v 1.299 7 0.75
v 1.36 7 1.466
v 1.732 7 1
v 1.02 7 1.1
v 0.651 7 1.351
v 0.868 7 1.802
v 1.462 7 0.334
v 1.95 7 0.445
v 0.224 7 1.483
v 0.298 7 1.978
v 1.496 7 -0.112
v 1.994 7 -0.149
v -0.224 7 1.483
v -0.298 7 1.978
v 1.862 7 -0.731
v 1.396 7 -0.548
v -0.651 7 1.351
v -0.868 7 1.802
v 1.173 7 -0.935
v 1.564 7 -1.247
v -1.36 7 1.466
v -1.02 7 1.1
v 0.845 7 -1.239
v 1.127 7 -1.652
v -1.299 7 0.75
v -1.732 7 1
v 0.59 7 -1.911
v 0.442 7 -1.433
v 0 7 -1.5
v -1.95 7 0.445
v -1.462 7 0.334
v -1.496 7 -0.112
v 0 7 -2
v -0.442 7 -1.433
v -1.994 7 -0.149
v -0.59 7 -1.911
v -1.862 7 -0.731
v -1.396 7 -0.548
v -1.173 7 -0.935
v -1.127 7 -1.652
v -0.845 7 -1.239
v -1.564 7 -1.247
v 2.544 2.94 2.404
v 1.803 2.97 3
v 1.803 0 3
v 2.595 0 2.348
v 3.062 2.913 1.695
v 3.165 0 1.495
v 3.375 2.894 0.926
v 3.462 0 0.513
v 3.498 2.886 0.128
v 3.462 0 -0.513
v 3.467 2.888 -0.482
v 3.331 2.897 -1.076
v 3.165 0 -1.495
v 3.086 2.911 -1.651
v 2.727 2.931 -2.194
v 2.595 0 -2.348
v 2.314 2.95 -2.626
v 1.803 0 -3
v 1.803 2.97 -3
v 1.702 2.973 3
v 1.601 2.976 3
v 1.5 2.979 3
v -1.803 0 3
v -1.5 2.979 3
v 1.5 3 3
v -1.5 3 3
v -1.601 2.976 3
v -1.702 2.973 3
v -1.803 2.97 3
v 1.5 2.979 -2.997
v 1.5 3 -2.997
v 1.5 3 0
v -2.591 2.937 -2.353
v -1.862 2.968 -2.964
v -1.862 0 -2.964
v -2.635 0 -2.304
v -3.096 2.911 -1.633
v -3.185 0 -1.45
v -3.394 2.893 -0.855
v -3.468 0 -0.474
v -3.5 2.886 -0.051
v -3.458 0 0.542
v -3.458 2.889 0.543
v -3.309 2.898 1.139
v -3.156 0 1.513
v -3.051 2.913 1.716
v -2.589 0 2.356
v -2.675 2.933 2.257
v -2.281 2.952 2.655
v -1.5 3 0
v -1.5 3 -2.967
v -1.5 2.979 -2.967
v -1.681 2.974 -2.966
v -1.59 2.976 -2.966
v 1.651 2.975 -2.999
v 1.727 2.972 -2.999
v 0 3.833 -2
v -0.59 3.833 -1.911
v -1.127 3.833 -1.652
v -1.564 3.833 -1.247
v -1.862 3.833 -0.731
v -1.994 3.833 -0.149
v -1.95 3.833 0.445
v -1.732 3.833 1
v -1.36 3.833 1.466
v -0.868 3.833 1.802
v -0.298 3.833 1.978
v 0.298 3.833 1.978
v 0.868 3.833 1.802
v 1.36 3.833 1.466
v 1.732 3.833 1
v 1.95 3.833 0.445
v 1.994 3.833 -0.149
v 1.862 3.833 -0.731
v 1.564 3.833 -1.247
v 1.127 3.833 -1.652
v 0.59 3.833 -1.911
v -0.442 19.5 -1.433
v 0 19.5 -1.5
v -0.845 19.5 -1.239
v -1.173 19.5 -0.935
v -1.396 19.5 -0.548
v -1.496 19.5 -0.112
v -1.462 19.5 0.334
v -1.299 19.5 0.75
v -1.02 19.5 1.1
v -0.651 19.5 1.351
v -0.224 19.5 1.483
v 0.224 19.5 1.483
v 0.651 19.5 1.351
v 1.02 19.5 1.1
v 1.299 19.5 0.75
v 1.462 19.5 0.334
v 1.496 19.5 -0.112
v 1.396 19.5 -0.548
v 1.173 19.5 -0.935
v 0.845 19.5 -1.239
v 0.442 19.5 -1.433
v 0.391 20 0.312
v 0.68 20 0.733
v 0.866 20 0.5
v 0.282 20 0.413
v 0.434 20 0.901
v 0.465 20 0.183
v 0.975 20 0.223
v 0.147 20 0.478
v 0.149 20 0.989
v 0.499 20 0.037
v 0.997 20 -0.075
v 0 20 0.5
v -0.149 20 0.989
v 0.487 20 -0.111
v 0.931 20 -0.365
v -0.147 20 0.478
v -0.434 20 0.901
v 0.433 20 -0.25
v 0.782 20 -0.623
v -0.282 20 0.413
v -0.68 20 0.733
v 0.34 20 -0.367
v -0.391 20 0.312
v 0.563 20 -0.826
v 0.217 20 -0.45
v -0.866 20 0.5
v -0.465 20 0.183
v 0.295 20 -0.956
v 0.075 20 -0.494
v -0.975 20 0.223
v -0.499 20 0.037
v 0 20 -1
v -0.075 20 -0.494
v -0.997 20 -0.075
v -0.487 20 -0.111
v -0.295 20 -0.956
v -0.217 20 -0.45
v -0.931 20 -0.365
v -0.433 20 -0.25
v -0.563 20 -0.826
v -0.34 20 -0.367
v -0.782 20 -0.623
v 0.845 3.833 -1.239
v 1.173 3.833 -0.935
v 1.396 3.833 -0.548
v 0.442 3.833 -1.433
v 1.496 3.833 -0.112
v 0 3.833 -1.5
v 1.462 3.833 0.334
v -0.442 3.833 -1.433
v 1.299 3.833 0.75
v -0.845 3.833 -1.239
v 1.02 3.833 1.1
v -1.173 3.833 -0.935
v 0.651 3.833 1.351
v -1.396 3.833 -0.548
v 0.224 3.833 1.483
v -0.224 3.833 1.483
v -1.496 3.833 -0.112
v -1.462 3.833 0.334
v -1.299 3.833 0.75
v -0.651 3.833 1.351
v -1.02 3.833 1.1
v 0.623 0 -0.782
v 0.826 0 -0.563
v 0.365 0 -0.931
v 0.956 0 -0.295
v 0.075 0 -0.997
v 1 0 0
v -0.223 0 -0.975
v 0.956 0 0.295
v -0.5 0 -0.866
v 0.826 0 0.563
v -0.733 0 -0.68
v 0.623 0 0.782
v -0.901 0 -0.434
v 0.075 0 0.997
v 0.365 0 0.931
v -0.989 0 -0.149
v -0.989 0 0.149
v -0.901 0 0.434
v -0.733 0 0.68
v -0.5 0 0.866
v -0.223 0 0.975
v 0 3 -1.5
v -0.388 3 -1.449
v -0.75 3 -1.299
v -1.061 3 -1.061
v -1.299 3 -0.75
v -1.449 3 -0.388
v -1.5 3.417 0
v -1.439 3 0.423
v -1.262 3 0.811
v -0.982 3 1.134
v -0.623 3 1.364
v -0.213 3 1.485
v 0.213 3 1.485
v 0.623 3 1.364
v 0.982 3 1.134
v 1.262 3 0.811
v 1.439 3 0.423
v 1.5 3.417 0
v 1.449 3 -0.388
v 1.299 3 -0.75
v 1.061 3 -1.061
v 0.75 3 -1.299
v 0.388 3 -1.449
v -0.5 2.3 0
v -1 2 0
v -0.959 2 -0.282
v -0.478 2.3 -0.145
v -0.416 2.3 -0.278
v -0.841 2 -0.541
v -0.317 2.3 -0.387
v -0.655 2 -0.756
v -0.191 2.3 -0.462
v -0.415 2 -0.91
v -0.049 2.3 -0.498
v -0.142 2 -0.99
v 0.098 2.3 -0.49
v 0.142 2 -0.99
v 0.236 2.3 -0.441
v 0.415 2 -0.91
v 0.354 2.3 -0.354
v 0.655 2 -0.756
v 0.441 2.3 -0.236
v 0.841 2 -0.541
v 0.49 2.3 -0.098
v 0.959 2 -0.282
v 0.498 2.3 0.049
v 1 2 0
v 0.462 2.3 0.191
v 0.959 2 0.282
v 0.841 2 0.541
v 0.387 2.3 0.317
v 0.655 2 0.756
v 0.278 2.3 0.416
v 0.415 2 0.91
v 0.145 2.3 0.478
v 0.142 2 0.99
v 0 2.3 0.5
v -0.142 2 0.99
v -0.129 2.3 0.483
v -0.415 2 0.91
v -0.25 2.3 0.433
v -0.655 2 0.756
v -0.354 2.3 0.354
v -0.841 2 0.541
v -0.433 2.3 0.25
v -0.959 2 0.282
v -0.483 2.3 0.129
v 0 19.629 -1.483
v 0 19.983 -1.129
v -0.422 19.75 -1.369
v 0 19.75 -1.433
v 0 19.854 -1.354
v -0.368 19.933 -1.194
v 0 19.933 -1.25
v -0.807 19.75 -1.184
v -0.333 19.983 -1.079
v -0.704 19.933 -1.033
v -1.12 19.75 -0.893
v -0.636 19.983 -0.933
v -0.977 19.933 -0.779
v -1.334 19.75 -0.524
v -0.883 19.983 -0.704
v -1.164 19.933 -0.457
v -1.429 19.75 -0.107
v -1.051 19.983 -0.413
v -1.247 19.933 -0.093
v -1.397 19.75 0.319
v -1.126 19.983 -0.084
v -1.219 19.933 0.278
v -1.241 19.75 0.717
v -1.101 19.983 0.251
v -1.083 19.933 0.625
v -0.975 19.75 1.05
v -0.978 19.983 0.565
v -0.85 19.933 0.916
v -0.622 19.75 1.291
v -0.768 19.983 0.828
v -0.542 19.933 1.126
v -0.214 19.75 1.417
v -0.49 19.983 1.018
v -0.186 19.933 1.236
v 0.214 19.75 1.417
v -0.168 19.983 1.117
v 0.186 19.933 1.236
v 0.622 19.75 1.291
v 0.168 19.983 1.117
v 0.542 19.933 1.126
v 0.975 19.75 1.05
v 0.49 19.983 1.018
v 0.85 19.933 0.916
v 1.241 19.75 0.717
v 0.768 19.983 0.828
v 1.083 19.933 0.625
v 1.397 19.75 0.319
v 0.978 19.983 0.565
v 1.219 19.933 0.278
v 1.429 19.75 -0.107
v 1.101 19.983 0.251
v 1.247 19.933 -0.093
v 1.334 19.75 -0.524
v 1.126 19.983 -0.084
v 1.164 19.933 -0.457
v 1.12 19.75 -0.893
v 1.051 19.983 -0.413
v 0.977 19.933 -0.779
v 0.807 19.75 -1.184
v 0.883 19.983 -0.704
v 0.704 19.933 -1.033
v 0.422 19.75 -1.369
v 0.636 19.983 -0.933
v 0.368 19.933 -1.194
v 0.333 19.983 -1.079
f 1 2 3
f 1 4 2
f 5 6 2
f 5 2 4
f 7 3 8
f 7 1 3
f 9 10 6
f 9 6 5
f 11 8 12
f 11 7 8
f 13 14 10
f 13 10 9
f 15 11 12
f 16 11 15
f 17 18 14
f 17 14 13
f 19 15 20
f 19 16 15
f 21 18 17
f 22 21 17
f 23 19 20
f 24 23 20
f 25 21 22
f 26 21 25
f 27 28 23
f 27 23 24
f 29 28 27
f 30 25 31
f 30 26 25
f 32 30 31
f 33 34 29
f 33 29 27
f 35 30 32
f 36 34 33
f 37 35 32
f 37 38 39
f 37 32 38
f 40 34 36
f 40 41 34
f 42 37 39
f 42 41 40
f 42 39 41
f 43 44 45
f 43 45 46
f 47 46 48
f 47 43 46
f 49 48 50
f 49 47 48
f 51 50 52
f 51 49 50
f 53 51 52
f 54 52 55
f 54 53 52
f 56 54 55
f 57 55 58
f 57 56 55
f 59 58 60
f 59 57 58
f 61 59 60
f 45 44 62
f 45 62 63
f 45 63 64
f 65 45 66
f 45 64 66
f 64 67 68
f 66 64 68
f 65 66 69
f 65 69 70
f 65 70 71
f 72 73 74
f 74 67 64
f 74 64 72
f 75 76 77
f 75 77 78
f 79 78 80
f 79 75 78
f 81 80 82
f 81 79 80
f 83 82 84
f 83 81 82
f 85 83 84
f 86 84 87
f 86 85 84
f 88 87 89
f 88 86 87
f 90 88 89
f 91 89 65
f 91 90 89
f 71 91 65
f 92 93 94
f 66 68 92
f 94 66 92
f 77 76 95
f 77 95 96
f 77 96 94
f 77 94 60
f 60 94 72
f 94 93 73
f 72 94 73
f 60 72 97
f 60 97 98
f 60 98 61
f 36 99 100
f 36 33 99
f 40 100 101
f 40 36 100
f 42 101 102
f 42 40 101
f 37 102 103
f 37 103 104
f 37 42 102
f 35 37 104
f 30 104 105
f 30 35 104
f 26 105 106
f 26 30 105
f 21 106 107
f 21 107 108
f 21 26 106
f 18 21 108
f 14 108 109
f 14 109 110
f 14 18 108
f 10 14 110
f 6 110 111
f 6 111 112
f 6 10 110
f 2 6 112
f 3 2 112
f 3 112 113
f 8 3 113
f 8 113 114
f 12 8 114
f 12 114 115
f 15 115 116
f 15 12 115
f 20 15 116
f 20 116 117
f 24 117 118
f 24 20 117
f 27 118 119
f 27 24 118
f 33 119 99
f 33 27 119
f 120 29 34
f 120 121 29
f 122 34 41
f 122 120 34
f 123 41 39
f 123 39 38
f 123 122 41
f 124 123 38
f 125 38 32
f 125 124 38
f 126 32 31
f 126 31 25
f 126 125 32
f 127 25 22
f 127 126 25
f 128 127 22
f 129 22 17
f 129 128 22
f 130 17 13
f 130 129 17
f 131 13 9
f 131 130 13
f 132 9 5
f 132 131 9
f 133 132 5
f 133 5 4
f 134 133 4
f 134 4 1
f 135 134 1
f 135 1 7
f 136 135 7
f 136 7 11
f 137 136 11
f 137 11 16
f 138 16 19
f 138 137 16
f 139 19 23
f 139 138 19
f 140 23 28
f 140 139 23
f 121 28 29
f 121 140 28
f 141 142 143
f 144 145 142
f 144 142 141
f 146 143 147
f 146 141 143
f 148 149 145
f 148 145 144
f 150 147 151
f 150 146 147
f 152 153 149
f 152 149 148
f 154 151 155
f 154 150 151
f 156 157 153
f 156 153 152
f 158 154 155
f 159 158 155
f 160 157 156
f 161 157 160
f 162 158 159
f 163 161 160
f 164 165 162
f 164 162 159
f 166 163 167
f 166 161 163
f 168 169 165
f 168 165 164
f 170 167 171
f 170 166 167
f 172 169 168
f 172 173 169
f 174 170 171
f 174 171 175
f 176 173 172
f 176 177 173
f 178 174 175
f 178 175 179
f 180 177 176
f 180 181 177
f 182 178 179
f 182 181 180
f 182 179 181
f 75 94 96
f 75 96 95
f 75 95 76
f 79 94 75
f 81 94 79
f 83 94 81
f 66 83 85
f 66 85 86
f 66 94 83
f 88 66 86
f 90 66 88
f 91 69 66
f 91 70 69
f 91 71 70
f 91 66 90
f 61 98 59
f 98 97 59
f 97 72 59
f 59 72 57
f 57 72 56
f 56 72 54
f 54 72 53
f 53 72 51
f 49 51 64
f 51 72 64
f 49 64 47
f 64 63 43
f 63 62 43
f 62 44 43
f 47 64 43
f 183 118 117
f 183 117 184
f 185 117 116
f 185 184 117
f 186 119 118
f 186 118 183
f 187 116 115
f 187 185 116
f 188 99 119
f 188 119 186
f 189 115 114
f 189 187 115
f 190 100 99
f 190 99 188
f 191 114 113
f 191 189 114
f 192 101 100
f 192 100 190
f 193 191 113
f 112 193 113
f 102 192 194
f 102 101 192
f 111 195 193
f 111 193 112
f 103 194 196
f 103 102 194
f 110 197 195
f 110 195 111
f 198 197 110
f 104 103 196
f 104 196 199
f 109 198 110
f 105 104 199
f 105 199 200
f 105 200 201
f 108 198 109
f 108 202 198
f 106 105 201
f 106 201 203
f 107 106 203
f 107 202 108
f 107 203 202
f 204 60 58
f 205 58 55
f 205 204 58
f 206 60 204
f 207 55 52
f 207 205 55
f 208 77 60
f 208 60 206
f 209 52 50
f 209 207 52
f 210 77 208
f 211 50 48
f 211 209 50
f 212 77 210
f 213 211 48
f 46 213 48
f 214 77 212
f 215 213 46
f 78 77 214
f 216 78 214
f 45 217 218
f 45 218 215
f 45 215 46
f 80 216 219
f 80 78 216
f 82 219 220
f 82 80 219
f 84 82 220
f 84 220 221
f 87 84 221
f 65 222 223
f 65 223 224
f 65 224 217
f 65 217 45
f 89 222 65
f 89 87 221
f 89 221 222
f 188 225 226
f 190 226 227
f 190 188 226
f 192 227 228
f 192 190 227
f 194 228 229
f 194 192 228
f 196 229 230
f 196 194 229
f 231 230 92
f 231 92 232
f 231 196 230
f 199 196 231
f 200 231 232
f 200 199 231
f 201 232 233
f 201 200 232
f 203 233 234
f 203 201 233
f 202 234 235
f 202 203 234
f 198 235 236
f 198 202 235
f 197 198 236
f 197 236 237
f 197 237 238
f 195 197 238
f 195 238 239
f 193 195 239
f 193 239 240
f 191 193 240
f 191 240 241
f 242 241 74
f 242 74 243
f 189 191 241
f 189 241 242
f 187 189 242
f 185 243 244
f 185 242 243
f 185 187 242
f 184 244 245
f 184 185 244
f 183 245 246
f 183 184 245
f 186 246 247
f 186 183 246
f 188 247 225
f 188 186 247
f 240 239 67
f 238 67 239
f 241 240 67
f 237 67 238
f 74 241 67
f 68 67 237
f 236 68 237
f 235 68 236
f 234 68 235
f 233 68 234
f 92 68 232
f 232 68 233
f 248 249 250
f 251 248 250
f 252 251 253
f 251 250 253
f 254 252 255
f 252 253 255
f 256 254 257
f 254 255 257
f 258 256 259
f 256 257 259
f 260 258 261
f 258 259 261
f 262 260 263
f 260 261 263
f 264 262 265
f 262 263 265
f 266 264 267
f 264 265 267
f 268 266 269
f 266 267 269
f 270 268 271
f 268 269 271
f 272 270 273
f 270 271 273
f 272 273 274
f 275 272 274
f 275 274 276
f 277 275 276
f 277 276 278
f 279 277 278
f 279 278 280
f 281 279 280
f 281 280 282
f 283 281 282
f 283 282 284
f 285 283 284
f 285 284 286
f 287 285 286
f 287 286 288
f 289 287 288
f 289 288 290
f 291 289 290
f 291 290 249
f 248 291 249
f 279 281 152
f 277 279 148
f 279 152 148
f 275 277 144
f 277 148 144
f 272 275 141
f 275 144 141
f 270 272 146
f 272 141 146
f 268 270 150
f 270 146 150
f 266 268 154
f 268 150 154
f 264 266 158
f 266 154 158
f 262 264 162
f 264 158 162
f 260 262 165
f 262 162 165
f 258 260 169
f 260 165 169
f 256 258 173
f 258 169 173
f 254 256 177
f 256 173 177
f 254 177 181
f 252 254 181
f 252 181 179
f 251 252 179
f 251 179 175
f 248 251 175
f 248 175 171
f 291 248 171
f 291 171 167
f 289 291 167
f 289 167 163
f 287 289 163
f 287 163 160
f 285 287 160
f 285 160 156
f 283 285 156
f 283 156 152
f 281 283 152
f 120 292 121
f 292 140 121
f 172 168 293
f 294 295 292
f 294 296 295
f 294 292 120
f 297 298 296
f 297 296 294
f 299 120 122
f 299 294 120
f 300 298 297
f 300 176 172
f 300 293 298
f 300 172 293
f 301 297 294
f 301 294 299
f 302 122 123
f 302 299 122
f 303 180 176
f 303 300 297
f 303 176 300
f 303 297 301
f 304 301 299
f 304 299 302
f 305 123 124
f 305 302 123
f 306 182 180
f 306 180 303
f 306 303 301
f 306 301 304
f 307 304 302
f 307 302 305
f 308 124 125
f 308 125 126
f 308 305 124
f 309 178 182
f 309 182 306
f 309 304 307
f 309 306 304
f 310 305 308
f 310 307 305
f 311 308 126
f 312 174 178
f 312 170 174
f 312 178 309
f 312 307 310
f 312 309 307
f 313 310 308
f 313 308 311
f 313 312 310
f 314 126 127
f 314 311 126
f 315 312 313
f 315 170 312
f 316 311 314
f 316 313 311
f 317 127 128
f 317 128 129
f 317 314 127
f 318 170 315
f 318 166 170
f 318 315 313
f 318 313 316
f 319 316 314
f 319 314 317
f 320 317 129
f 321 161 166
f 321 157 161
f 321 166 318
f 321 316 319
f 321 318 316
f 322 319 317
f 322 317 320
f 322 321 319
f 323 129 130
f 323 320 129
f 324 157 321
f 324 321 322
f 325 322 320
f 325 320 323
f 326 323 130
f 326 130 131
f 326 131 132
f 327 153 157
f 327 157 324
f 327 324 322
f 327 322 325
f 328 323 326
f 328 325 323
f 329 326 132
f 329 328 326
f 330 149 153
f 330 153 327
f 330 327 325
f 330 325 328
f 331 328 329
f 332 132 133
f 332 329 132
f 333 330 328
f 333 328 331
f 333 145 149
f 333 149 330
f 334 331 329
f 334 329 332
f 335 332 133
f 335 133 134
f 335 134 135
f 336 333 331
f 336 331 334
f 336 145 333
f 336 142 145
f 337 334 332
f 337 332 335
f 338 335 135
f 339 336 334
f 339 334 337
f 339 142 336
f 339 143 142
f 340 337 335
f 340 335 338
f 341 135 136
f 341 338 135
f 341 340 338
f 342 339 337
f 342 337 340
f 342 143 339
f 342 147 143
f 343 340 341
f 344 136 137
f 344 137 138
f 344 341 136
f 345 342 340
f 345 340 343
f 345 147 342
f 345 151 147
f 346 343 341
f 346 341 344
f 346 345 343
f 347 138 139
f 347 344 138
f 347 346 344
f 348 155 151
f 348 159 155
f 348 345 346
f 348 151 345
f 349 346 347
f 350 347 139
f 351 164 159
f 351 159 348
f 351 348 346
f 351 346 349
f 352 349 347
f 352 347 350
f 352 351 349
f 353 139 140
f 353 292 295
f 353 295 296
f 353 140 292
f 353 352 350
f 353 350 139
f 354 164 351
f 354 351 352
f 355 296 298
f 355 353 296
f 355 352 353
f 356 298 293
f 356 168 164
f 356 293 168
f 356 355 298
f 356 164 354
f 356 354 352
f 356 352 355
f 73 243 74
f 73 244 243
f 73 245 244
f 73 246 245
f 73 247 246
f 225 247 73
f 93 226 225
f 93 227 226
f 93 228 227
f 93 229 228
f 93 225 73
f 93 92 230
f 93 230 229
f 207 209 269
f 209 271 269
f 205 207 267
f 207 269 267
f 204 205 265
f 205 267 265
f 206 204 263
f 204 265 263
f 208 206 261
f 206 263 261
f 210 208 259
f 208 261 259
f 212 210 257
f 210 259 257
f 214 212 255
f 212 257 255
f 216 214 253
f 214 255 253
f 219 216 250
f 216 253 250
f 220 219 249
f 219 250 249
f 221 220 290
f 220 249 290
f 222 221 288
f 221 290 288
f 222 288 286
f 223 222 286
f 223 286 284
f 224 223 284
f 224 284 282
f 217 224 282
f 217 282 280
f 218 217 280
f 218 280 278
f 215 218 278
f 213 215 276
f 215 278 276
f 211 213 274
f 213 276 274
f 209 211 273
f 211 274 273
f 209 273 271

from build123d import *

# Parameters (mm, degrees)
SKETCH2_R                 = 0.5
CUT_EXTRUDE2_DEPTH        = 21.603397778
F_2_0MM_DOWEL_HOLE1_D     = 2
F_2_0MM_DOWEL_HOLE1_DEPTH = 2
F_2_0MM_DOWEL_HOLE1_TIP   = 0.600860619
CUT_EXTRUDE3_DEPTH        = 21.603397778
CUT_EXTRUDE4_DEPTH        = 10


with BuildPart() as part:
    # Sketch1 → Revolve2 (revolve)
    with BuildSketch(Plane.XY, mode=Mode.PRIVATE) as revolve2_sk:
        with BuildLine():
            Line((0, 0), (-3.5, 0))
            Line((-3.5, 0), (-3.5, 3))
            Line((-3.5, 3), (-1.5, 3))
            Line((-1.5, 3), (-1.5, 3.833209081))
            Line((-1.5, 3.833209081), (-2, 3.833209081))
            Line((-2, 3.833209081), (-2, 7))
            Line((-2, 7), (-1.5, 7))
            Line((-1.5, 7), (-1.5, 19.5))
            ThreePointArc((-1.5, 19.5), (-1.353553391, 19.853553391), (-1, 20))
            Line((-1, 20), (0, 20))
            Line((0, 20), (0, 0))
        make_face()
    revolve(revolve2_sk.sketch.rotate(Axis((0, 7, 0), (0, 1, 0)), 270), axis=Axis((0, 7, 0), (0, 1, 0)))

    # Sketch2 → Cut-Extrude2 (cut, through all)
    with BuildSketch(Plane(origin=(0, 20, 0), x_dir=(1, 0, 0), z_dir=(0, 1, 0))):
        with Locations(Location((0, 0, 0), (0, 0, 270))):
            Circle(SKETCH2_R)
    extrude(amount=-CUT_EXTRUDE2_DEPTH, mode=Mode.SUBTRACT)

    # Ø2.0mm Dowel Hole1
    with Locations(Plane(origin=(0, 0, 0), x_dir=(-1, 0, 0), z_dir=(0, -1, 0))):
        with Locations((0, 0)):
            Hole(F_2_0MM_DOWEL_HOLE1_D / 2, depth=F_2_0MM_DOWEL_HOLE1_DEPTH)
            with Locations((0, 0, -(F_2_0MM_DOWEL_HOLE1_DEPTH + F_2_0MM_DOWEL_HOLE1_TIP / 2))):  # 118° drill point
                Cone(0, F_2_0MM_DOWEL_HOLE1_D / 2, F_2_0MM_DOWEL_HOLE1_TIP, mode=Mode.SUBTRACT)

    # Sketch6 → Cut-Extrude3 (cut, through all)
    with BuildSketch(Plane(origin=(0, 20, 0), x_dir=(1, 0, 0), z_dir=(0, 1, 0))):
        with BuildLine():
            Line((1.802775638, -3), (-1.802775638, -3))
            ThreePointArc((-1.802775638, -3), (0, -3.5), (1.802775638, -3))
        make_face()
        with BuildLine():
            Line((-1.861759264, 2.963756475), (1.802775638, 3))
            ThreePointArc((1.802775638, 3), (-0.034614525, 3.499828829), (-1.861759264, 2.963756475))
        make_face()
    extrude(amount=-CUT_EXTRUDE3_DEPTH, mode=Mode.SUBTRACT)

    # Sketch7 → Cut-Extrude4 (cut)
    with BuildSketch(Plane.XY.offset(3)):
        with BuildLine():
            Line((-6.314985728, 2.627394042), (-6.005388139, 3.404344388))
            Line((-6.005388139, 3.404344388), (-1.5, 3.41660454))
            Line((-1.5, 3.41660454), (-1.5, 2.979046191))
            ThreePointArc((-1.5, 2.979046191), (-3.9114467, 2.857357895), (-6.314985728, 2.627394042))
        make_face()
        with BuildLine():
            Line((5.565529025, 2.710812451), (5.565529025, 3.41660454))
            Line((5.565529025, 3.41660454), (1.5, 3.41660454))
            Line((1.5, 3.41660454), (1.5, 2.979046191))
            ThreePointArc((1.5, 2.979046191), (3.535309383, 2.883501076), (5.565529025, 2.710812451))
        make_face()
    extrude(amount=-CUT_EXTRUDE4_DEPTH, mode=Mode.SUBTRACT)


solid = part.part
